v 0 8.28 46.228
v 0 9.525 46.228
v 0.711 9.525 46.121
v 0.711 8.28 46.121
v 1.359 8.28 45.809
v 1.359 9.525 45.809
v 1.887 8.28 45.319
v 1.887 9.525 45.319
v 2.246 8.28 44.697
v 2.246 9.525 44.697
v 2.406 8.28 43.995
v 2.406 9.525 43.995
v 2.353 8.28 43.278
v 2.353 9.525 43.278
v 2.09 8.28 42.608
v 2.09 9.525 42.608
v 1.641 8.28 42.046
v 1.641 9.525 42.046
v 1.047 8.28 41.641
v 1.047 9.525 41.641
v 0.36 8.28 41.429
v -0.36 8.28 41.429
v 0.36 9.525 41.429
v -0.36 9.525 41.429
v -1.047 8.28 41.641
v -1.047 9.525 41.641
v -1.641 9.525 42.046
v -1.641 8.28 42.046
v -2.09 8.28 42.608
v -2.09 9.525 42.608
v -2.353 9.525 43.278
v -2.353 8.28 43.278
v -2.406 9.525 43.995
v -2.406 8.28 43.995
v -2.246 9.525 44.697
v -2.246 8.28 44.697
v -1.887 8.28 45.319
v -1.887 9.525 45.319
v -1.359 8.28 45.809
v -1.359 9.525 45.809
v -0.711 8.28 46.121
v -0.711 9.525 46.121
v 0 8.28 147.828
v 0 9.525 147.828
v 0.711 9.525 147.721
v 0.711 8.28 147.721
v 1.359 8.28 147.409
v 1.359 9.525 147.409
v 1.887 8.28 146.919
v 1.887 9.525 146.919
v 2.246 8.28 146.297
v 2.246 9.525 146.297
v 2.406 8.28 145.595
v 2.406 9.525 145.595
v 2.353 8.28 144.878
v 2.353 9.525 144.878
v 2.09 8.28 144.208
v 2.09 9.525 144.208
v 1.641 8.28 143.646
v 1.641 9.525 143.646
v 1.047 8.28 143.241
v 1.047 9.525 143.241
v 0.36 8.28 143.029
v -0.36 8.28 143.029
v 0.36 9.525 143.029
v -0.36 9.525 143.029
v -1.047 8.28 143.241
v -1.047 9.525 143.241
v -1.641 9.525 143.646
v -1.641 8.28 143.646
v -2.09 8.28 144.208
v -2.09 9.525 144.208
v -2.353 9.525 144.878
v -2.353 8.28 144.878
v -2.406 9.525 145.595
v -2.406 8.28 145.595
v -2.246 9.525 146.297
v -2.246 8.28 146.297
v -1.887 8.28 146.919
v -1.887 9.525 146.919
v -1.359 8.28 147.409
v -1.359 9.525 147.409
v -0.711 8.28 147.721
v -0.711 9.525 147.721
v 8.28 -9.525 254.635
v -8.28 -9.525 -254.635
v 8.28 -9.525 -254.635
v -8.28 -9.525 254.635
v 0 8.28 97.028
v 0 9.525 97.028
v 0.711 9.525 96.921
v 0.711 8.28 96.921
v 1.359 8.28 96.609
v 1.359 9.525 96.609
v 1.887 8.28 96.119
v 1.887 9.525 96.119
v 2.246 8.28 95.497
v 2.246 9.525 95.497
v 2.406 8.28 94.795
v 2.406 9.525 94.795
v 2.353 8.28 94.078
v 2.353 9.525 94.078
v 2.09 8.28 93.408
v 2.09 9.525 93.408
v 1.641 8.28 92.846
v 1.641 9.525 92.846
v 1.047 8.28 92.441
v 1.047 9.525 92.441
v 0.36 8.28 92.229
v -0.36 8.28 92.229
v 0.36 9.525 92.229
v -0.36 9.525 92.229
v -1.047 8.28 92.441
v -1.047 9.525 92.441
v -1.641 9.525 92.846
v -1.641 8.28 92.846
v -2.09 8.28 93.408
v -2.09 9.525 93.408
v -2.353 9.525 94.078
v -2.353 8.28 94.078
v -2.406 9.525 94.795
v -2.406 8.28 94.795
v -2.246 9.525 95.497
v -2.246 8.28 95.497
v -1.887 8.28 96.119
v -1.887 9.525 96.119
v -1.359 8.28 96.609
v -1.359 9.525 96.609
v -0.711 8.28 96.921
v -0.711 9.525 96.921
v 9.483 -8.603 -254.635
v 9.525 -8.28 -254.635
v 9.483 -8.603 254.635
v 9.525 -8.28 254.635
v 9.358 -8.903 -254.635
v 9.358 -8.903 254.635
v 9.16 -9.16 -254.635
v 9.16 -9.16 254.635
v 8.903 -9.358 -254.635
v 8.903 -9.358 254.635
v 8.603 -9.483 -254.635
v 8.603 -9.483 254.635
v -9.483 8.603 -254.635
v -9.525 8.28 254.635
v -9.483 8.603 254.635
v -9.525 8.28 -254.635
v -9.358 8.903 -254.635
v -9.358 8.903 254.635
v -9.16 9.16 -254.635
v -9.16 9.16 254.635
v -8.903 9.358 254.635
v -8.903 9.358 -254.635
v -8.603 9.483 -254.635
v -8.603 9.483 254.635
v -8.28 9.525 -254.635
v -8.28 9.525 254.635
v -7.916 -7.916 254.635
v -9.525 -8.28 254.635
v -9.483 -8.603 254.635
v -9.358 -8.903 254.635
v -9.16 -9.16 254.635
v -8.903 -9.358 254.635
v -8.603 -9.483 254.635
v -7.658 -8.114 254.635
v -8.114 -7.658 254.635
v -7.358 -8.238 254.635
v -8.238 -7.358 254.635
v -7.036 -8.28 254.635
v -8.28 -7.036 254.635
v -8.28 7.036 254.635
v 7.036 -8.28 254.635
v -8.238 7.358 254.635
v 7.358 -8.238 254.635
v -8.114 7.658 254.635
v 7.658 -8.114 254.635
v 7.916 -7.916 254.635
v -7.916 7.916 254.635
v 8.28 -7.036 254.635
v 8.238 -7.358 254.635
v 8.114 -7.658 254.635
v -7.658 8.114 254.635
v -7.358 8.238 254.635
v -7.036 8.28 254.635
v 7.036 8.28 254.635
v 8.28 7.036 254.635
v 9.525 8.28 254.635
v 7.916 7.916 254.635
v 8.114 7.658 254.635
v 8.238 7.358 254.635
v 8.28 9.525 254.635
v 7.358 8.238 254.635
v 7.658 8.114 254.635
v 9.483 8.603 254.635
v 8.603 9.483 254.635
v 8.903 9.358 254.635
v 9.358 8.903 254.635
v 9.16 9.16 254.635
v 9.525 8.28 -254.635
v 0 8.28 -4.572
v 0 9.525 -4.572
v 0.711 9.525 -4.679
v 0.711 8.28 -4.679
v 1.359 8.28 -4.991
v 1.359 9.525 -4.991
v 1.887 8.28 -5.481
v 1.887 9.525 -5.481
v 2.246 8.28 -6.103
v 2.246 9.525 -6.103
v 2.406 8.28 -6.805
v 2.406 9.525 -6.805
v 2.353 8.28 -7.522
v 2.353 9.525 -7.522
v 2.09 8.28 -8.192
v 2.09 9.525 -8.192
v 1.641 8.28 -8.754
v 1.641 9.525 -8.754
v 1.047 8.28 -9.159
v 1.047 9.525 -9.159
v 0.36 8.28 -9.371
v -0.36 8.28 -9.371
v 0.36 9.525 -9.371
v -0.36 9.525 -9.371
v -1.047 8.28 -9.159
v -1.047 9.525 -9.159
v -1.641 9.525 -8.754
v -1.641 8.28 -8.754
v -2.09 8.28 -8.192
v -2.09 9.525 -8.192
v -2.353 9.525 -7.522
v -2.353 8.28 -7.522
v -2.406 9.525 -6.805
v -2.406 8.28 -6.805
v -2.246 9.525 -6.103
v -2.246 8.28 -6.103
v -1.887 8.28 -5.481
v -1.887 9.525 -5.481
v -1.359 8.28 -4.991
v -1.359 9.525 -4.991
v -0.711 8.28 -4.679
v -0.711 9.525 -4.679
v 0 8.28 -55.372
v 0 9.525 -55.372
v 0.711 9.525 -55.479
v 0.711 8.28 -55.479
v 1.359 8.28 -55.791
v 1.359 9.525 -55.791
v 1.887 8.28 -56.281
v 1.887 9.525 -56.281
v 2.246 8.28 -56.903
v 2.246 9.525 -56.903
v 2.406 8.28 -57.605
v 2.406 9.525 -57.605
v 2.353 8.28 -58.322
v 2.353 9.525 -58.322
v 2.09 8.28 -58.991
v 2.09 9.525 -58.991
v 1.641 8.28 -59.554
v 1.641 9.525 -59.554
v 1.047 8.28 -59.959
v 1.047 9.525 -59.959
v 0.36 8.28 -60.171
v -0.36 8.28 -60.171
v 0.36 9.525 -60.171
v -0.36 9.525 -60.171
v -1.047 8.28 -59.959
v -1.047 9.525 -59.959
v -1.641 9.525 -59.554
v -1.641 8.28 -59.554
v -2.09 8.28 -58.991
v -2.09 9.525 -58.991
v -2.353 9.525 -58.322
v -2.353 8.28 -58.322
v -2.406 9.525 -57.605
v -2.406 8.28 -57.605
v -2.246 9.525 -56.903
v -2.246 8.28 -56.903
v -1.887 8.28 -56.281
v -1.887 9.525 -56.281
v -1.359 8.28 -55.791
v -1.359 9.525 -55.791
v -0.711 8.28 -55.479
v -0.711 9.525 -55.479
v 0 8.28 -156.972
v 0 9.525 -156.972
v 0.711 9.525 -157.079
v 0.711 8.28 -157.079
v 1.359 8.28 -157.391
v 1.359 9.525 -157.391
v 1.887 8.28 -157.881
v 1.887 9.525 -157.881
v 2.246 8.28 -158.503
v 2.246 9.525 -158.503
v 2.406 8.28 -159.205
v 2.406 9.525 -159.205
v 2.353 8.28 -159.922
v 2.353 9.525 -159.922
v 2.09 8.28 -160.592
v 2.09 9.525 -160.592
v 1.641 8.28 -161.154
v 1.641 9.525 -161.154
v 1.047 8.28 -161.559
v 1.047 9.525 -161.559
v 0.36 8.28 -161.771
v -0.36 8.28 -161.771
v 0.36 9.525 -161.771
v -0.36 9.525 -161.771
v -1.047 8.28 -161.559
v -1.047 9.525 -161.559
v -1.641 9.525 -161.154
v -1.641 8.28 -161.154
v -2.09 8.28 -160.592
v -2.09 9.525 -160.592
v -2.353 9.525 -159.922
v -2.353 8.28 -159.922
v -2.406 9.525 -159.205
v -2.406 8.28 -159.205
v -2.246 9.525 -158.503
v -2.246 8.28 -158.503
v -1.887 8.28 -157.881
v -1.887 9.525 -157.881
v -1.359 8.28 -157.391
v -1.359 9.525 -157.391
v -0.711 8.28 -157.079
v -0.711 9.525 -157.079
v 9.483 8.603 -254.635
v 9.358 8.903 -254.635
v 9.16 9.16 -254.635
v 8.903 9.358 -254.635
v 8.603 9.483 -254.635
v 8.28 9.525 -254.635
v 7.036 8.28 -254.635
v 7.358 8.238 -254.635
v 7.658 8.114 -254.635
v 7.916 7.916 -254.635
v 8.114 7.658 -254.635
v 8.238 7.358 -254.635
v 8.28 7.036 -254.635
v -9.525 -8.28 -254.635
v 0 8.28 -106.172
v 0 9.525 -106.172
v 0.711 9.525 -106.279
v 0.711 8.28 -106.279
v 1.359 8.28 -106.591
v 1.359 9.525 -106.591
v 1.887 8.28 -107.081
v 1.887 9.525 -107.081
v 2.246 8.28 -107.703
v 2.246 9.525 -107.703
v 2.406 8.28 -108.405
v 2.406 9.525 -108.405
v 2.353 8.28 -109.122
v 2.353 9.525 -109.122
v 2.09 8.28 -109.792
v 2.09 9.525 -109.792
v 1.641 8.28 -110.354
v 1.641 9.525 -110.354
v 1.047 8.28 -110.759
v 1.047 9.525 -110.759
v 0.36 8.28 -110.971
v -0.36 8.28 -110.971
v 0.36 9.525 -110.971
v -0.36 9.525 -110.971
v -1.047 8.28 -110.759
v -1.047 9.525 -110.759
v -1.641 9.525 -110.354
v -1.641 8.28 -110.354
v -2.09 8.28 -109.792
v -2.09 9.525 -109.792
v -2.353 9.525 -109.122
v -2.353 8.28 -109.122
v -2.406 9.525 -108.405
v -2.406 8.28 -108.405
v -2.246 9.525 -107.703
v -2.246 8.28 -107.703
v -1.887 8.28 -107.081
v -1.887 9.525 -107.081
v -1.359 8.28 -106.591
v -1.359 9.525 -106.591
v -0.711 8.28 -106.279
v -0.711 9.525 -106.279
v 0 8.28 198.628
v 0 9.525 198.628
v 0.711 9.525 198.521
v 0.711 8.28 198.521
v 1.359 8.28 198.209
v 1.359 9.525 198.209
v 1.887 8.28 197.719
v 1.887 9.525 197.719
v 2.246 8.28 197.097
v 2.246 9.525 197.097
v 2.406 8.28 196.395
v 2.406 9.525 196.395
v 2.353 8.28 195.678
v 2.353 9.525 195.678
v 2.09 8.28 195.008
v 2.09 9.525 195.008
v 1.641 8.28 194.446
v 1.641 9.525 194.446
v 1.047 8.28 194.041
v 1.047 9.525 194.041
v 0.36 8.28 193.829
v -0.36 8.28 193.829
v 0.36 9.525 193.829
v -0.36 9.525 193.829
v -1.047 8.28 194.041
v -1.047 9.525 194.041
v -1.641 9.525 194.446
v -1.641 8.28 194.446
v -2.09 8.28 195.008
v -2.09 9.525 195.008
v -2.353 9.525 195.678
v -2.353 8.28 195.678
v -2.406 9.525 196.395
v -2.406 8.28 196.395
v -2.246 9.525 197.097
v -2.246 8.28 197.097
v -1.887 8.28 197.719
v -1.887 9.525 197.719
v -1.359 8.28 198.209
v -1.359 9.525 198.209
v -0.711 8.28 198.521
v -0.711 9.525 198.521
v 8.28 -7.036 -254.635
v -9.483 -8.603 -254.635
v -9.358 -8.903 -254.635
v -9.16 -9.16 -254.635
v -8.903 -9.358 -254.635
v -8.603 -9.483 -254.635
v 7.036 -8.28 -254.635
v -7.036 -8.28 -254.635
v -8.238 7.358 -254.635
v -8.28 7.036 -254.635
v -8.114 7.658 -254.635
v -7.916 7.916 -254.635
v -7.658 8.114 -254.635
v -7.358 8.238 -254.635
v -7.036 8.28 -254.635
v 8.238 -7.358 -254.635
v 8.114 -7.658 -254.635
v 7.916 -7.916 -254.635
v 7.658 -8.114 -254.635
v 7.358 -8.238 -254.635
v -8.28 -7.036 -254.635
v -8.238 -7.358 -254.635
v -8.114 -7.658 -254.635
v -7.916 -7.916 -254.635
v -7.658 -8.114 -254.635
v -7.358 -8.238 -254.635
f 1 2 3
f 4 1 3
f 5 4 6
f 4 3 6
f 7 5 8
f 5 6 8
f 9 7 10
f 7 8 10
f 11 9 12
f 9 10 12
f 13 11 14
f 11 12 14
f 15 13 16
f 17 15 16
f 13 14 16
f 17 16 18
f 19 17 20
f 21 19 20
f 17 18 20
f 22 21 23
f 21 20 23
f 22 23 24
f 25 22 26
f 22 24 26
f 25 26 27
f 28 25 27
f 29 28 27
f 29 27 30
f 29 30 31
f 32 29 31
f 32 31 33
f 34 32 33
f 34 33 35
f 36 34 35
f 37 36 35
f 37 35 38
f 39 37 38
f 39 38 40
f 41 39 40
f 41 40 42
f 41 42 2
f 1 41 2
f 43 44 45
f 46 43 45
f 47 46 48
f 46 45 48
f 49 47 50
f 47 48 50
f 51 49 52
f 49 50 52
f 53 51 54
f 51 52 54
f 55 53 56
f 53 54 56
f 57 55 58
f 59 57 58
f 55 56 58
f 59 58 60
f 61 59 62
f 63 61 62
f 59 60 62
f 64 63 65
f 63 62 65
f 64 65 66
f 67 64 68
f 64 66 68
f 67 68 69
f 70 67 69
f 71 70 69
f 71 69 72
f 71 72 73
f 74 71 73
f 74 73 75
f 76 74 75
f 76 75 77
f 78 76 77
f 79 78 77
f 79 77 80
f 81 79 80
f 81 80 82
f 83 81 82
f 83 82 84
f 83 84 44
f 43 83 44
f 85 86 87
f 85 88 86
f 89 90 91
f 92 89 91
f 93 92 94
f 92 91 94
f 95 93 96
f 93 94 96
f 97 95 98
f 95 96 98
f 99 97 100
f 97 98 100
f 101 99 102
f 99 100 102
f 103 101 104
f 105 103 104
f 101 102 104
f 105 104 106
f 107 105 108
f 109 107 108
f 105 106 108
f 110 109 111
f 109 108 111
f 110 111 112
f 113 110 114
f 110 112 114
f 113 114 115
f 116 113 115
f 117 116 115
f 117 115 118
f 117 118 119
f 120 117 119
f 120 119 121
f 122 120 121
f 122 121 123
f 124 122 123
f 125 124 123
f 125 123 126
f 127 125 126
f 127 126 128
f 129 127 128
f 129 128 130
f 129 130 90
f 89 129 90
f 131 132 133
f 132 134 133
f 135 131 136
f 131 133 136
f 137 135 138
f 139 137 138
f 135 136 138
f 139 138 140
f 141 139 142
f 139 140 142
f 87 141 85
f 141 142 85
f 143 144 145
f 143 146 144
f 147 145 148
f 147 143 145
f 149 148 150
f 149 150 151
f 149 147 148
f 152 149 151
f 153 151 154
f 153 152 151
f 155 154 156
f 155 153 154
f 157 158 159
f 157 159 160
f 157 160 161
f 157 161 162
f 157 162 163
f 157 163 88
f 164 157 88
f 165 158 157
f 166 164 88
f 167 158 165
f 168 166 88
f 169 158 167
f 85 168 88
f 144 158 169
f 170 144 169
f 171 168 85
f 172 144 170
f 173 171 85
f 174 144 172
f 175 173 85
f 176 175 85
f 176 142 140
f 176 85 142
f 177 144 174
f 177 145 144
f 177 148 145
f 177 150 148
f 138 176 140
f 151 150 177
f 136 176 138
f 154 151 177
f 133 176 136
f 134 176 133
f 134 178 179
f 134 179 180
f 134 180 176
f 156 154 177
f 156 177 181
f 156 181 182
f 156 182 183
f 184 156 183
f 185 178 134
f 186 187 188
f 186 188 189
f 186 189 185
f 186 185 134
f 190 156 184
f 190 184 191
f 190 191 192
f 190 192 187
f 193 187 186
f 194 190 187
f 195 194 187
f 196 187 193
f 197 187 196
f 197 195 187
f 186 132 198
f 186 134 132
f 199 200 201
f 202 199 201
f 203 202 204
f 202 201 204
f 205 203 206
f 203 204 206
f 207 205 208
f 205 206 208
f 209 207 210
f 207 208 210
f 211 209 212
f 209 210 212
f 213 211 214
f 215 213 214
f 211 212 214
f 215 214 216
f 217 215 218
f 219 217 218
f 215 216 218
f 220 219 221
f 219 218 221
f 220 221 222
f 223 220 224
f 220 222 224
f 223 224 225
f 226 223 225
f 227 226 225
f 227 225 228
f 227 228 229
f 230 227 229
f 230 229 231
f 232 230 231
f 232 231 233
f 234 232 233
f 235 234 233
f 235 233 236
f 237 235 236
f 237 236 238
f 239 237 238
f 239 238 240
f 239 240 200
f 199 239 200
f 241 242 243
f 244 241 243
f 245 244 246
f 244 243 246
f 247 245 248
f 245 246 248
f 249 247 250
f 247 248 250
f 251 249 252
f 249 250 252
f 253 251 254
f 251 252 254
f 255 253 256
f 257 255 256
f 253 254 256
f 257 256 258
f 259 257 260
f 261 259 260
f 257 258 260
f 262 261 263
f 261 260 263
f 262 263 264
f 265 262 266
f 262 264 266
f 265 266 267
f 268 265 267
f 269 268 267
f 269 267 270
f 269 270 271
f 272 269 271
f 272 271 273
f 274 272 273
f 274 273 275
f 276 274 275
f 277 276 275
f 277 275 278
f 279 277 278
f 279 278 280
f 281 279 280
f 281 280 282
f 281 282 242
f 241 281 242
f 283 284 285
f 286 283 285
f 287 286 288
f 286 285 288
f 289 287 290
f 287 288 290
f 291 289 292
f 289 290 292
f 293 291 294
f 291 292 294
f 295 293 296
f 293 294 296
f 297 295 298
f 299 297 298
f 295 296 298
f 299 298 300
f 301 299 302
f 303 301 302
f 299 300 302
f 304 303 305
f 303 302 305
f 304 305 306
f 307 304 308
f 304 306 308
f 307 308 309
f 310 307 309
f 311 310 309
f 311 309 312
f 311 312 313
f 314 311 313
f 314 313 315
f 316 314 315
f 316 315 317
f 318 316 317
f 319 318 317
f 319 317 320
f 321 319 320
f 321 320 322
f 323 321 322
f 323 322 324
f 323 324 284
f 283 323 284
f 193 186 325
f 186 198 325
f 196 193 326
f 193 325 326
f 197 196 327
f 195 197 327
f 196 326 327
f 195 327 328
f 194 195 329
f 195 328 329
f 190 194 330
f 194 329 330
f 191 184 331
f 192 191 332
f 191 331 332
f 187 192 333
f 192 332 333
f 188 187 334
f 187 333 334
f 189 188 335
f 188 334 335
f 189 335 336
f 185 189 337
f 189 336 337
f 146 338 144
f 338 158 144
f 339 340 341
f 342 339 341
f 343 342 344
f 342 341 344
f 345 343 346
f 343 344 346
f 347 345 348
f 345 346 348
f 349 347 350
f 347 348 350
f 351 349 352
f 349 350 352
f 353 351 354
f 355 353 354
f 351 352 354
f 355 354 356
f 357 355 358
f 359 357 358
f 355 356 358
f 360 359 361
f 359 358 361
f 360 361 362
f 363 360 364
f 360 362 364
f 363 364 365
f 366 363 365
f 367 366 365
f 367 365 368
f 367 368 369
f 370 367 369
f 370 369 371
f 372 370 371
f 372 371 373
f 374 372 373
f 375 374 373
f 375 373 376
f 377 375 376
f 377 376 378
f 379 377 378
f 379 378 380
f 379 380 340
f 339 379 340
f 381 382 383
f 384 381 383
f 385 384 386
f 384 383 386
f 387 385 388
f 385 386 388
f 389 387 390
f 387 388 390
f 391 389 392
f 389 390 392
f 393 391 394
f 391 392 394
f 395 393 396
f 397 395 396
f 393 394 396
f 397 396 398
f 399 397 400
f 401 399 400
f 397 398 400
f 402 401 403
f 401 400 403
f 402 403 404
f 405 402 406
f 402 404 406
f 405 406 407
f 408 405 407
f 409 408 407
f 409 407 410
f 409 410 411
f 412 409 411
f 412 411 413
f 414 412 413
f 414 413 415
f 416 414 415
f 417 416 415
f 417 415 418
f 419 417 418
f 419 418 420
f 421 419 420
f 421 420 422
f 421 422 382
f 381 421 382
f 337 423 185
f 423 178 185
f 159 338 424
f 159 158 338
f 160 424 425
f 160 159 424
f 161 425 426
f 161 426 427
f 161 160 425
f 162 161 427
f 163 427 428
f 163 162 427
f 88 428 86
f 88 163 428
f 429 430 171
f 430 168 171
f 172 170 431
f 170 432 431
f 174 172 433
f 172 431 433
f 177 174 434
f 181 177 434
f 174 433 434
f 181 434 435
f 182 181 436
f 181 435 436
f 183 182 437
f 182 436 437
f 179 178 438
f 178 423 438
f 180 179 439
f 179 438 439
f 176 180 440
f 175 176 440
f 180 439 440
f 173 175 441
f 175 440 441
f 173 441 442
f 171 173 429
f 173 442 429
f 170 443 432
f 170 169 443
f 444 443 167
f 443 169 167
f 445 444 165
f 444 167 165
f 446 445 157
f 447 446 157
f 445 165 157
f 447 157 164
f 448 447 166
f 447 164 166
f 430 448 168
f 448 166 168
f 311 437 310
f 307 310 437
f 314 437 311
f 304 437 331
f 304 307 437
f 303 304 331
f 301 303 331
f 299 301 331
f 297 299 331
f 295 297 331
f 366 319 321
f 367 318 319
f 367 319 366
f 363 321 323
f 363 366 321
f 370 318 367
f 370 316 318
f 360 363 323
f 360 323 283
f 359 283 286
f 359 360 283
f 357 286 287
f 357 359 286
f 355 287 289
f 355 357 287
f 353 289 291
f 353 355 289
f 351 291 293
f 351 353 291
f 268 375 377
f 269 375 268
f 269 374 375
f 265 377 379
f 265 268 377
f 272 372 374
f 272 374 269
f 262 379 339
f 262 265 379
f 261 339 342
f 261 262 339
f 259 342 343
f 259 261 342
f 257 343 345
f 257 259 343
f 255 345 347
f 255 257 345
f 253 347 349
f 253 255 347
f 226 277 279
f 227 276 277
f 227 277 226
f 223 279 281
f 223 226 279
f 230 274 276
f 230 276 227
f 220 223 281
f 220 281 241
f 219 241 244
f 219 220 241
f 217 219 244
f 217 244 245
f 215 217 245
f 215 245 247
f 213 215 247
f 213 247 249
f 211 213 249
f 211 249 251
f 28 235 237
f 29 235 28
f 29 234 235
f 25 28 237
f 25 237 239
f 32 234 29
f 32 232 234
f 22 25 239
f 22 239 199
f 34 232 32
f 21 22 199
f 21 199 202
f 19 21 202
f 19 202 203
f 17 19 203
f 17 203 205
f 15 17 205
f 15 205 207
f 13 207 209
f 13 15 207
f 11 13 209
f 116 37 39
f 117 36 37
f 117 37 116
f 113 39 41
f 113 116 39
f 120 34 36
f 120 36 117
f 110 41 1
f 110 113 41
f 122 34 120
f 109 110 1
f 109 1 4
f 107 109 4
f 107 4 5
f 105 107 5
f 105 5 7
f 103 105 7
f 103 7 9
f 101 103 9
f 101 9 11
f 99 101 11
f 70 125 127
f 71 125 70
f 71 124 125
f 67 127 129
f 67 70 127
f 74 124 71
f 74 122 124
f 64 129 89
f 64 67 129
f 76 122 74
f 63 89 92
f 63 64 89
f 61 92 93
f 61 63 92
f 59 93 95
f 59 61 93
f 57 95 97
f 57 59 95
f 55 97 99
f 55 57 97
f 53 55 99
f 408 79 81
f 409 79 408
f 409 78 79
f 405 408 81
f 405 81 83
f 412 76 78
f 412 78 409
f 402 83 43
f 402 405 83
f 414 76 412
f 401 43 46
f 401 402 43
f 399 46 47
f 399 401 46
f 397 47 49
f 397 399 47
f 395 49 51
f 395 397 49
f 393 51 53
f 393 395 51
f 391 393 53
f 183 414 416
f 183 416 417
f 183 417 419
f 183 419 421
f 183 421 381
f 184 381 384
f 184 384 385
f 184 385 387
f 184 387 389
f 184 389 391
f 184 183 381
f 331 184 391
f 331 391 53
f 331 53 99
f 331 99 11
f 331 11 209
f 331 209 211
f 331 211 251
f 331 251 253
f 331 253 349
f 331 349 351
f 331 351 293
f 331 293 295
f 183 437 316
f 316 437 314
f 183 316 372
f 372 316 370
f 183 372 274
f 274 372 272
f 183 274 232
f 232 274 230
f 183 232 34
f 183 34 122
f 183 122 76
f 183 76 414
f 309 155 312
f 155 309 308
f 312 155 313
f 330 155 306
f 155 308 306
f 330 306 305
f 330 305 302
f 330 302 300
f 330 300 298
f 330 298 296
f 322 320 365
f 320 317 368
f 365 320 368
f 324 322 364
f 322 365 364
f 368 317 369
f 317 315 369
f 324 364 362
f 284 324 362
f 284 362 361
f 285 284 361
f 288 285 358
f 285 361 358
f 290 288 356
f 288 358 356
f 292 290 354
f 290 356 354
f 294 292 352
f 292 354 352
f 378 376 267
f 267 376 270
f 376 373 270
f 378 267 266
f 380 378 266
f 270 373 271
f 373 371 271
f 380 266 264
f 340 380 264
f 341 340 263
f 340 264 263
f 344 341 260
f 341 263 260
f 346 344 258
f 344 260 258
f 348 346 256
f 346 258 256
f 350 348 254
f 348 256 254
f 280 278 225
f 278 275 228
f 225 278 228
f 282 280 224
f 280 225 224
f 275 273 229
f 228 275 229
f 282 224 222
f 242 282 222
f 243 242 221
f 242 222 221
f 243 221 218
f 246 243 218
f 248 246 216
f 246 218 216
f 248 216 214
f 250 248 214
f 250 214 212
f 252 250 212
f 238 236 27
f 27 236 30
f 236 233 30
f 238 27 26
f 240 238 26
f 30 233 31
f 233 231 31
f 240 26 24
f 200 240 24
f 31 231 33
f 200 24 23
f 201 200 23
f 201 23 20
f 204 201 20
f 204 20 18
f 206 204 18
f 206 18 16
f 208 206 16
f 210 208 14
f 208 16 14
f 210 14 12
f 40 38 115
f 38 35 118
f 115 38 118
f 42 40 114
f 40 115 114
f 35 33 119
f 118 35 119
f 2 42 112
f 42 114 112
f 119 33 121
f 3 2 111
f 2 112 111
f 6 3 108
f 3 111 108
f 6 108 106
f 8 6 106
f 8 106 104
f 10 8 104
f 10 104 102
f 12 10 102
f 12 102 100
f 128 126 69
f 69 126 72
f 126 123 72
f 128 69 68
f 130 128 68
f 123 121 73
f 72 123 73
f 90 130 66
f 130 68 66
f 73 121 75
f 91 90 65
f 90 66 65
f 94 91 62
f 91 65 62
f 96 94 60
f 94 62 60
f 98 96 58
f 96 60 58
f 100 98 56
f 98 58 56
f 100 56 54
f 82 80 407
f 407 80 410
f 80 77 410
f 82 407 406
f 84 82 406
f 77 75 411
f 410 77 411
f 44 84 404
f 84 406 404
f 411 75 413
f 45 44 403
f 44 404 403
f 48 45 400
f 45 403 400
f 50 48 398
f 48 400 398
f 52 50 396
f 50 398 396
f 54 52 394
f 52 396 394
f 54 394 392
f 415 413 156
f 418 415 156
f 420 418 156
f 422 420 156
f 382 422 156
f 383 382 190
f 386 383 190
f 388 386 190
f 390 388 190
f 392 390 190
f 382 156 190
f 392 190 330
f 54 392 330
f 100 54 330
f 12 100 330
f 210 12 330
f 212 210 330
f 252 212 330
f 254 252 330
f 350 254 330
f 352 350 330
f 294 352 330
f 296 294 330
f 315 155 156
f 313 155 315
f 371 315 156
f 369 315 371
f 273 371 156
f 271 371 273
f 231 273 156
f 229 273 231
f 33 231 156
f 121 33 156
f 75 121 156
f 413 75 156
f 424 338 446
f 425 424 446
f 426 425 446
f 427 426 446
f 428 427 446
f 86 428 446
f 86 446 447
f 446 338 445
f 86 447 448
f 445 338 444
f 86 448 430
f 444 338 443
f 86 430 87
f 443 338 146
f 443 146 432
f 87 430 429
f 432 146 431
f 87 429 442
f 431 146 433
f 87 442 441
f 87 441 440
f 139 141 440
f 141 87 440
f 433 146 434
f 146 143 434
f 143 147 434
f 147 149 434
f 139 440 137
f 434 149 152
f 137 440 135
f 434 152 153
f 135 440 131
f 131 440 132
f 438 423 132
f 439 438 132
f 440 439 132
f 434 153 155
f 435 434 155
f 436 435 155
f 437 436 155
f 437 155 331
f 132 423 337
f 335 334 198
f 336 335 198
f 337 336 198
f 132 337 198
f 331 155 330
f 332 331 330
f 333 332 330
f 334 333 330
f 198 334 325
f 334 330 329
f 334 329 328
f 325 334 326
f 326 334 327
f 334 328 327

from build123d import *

# Parameters (mm, degrees)
SKETCH3_W           = 19.05
SKETCH3_H           = 19.05
SKETCH3_W_2         = 16.5608
SKETCH3_H_2         = 16.5608
BOSS_EXTRUDE1_DEPTH = 254.635
FILLET1_R           = 1.2446
CUT_EXTRUDE1_REACH  = 257.524
SKETCH4_R           = 2.413


with BuildPart() as part:
    # Sketch3 → Boss-Extrude1 (new, symmetric)
    with BuildSketch(Plane.XY):
        Rectangle(SKETCH3_W, SKETCH3_H)
        Rectangle(SKETCH3_W_2, SKETCH3_H_2, mode=Mode.SUBTRACT)
    extrude(amount=BOSS_EXTRUDE1_DEPTH, both=True)

    # Fillet1
    fillet1_edges = [part.edges().sort_by_distance(p)[0] for p in [
        (-9.525, 9.525, 0),
        (8.2804, -8.2804, 0),
        (-8.2804, -8.2804, 0),
        (-8.2804, 8.2804, 0),
        (8.2804, 8.2804, 0),
        (9.525, -9.525, 0),
        (-9.525, -9.525, 0),
        (9.525, 9.525, 0),
    ]]
    fillet(fillet1_edges, radius=FILLET1_R)

    # Sketch4 → Cut-Extrude1 (cut, up to next)
    with BuildSketch(Plane(origin=(0, 9.525, 0), x_dir=(1, 0, 0), z_dir=(0, 1, 0)), mode=Mode.PRIVATE) as cut_extrude1_sk1:
        with Locations((0, 159.385)):
            Circle(SKETCH4_R)
    cut_extrude1_tool1 = extrude(cut_extrude1_sk1.sketch, amount=-CUT_EXTRUDE1_REACH, mode=Mode.PRIVATE) & part.part
    # Sketch4 → Cut-Extrude1 (cut, up to next)
    with BuildSketch(Plane(origin=(0, 9.525, 0), x_dir=(1, 0, 0), z_dir=(0, 1, 0)), mode=Mode.PRIVATE) as cut_extrude1_sk2:
        with Locations((0, 108.585)):
            Circle(SKETCH4_R)
    cut_extrude1_tool2 = extrude(cut_extrude1_sk2.sketch, amount=-CUT_EXTRUDE1_REACH, mode=Mode.PRIVATE) & part.part
    # Sketch4 → Cut-Extrude1 (cut, up to next)
    with BuildSketch(Plane(origin=(0, 9.525, 0), x_dir=(1, 0, 0), z_dir=(0, 1, 0)), mode=Mode.PRIVATE) as cut_extrude1_sk3:
        with Locations((0, 57.785)):
            Circle(SKETCH4_R)
    cut_extrude1_tool3 = extrude(cut_extrude1_sk3.sketch, amount=-CUT_EXTRUDE1_REACH, mode=Mode.PRIVATE) & part.part
    # Sketch4 → Cut-Extrude1 (cut, up to next)
    with BuildSketch(Plane(origin=(0, 9.525, 0), x_dir=(1, 0, 0), z_dir=(0, 1, 0)), mode=Mode.PRIVATE) as cut_extrude1_sk4:
        with Locations((0, 6.985)):
            Circle(SKETCH4_R)
    cut_extrude1_tool4 = extrude(cut_extrude1_sk4.sketch, amount=-CUT_EXTRUDE1_REACH, mode=Mode.PRIVATE) & part.part
    # Sketch4 → Cut-Extrude1 (cut, up to next)
    with BuildSketch(Plane(origin=(0, 9.525, 0), x_dir=(1, 0, 0), z_dir=(0, 1, 0)), mode=Mode.PRIVATE) as cut_extrude1_sk5:
        with Locations((0, -43.815)):
            Circle(SKETCH4_R)
    cut_extrude1_tool5 = extrude(cut_extrude1_sk5.sketch, amount=-CUT_EXTRUDE1_REACH, mode=Mode.PRIVATE) & part.part
    # Sketch4 → Cut-Extrude1 (cut, up to next)
    with BuildSketch(Plane(origin=(0, 9.525, 0), x_dir=(1, 0, 0), z_dir=(0, 1, 0)), mode=Mode.PRIVATE) as cut_extrude1_sk6:
        with Locations((0, -94.615)):
            Circle(SKETCH4_R)
    cut_extrude1_tool6 = extrude(cut_extrude1_sk6.sketch, amount=-CUT_EXTRUDE1_REACH, mode=Mode.PRIVATE) & part.part
    # Sketch4 → Cut-Extrude1 (cut, up to next)
    with BuildSketch(Plane(origin=(0, 9.525, 0), x_dir=(1, 0, 0), z_dir=(0, 1, 0)), mode=Mode.PRIVATE) as cut_extrude1_sk7:
        with Locations((0, -145.415)):
            Circle(SKETCH4_R)
    cut_extrude1_tool7 = extrude(cut_extrude1_sk7.sketch, amount=-CUT_EXTRUDE1_REACH, mode=Mode.PRIVATE) & part.part
    # Sketch4 → Cut-Extrude1 (cut, up to next)
    with BuildSketch(Plane(origin=(0, 9.525, 0), x_dir=(1, 0, 0), z_dir=(0, 1, 0)), mode=Mode.PRIVATE) as cut_extrude1_sk8:
        with Locations((0, -196.215)):
            Circle(SKETCH4_R)
    cut_extrude1_tool8 = extrude(cut_extrude1_sk8.sketch, amount=-CUT_EXTRUDE1_REACH, mode=Mode.PRIVATE) & part.part
    add(cut_extrude1_tool1.solids().sort_by_distance((0, 9.525, -159.385))[0], mode=Mode.SUBTRACT)
    add(cut_extrude1_tool2.solids().sort_by_distance((0, 9.525, -108.585))[0], mode=Mode.SUBTRACT)
    add(cut_extrude1_tool3.solids().sort_by_distance((0, 9.525, -57.785))[0], mode=Mode.SUBTRACT)
    add(cut_extrude1_tool4.solids().sort_by_distance((0, 9.525, -6.985))[0], mode=Mode.SUBTRACT)
    add(cut_extrude1_tool5.solids().sort_by_distance((0, 9.525, 43.815))[0], mode=Mode.SUBTRACT)
    add(cut_extrude1_tool6.solids().sort_by_distance((0, 9.525, 94.615))[0], mode=Mode.SUBTRACT)
    add(cut_extrude1_tool7.solids().sort_by_distance((0, 9.525, 145.415))[0], mode=Mode.SUBTRACT)
    add(cut_extrude1_tool8.solids().sort_by_distance((0, 9.525, 196.215))[0], mode=Mode.SUBTRACT)


solid = part.part
